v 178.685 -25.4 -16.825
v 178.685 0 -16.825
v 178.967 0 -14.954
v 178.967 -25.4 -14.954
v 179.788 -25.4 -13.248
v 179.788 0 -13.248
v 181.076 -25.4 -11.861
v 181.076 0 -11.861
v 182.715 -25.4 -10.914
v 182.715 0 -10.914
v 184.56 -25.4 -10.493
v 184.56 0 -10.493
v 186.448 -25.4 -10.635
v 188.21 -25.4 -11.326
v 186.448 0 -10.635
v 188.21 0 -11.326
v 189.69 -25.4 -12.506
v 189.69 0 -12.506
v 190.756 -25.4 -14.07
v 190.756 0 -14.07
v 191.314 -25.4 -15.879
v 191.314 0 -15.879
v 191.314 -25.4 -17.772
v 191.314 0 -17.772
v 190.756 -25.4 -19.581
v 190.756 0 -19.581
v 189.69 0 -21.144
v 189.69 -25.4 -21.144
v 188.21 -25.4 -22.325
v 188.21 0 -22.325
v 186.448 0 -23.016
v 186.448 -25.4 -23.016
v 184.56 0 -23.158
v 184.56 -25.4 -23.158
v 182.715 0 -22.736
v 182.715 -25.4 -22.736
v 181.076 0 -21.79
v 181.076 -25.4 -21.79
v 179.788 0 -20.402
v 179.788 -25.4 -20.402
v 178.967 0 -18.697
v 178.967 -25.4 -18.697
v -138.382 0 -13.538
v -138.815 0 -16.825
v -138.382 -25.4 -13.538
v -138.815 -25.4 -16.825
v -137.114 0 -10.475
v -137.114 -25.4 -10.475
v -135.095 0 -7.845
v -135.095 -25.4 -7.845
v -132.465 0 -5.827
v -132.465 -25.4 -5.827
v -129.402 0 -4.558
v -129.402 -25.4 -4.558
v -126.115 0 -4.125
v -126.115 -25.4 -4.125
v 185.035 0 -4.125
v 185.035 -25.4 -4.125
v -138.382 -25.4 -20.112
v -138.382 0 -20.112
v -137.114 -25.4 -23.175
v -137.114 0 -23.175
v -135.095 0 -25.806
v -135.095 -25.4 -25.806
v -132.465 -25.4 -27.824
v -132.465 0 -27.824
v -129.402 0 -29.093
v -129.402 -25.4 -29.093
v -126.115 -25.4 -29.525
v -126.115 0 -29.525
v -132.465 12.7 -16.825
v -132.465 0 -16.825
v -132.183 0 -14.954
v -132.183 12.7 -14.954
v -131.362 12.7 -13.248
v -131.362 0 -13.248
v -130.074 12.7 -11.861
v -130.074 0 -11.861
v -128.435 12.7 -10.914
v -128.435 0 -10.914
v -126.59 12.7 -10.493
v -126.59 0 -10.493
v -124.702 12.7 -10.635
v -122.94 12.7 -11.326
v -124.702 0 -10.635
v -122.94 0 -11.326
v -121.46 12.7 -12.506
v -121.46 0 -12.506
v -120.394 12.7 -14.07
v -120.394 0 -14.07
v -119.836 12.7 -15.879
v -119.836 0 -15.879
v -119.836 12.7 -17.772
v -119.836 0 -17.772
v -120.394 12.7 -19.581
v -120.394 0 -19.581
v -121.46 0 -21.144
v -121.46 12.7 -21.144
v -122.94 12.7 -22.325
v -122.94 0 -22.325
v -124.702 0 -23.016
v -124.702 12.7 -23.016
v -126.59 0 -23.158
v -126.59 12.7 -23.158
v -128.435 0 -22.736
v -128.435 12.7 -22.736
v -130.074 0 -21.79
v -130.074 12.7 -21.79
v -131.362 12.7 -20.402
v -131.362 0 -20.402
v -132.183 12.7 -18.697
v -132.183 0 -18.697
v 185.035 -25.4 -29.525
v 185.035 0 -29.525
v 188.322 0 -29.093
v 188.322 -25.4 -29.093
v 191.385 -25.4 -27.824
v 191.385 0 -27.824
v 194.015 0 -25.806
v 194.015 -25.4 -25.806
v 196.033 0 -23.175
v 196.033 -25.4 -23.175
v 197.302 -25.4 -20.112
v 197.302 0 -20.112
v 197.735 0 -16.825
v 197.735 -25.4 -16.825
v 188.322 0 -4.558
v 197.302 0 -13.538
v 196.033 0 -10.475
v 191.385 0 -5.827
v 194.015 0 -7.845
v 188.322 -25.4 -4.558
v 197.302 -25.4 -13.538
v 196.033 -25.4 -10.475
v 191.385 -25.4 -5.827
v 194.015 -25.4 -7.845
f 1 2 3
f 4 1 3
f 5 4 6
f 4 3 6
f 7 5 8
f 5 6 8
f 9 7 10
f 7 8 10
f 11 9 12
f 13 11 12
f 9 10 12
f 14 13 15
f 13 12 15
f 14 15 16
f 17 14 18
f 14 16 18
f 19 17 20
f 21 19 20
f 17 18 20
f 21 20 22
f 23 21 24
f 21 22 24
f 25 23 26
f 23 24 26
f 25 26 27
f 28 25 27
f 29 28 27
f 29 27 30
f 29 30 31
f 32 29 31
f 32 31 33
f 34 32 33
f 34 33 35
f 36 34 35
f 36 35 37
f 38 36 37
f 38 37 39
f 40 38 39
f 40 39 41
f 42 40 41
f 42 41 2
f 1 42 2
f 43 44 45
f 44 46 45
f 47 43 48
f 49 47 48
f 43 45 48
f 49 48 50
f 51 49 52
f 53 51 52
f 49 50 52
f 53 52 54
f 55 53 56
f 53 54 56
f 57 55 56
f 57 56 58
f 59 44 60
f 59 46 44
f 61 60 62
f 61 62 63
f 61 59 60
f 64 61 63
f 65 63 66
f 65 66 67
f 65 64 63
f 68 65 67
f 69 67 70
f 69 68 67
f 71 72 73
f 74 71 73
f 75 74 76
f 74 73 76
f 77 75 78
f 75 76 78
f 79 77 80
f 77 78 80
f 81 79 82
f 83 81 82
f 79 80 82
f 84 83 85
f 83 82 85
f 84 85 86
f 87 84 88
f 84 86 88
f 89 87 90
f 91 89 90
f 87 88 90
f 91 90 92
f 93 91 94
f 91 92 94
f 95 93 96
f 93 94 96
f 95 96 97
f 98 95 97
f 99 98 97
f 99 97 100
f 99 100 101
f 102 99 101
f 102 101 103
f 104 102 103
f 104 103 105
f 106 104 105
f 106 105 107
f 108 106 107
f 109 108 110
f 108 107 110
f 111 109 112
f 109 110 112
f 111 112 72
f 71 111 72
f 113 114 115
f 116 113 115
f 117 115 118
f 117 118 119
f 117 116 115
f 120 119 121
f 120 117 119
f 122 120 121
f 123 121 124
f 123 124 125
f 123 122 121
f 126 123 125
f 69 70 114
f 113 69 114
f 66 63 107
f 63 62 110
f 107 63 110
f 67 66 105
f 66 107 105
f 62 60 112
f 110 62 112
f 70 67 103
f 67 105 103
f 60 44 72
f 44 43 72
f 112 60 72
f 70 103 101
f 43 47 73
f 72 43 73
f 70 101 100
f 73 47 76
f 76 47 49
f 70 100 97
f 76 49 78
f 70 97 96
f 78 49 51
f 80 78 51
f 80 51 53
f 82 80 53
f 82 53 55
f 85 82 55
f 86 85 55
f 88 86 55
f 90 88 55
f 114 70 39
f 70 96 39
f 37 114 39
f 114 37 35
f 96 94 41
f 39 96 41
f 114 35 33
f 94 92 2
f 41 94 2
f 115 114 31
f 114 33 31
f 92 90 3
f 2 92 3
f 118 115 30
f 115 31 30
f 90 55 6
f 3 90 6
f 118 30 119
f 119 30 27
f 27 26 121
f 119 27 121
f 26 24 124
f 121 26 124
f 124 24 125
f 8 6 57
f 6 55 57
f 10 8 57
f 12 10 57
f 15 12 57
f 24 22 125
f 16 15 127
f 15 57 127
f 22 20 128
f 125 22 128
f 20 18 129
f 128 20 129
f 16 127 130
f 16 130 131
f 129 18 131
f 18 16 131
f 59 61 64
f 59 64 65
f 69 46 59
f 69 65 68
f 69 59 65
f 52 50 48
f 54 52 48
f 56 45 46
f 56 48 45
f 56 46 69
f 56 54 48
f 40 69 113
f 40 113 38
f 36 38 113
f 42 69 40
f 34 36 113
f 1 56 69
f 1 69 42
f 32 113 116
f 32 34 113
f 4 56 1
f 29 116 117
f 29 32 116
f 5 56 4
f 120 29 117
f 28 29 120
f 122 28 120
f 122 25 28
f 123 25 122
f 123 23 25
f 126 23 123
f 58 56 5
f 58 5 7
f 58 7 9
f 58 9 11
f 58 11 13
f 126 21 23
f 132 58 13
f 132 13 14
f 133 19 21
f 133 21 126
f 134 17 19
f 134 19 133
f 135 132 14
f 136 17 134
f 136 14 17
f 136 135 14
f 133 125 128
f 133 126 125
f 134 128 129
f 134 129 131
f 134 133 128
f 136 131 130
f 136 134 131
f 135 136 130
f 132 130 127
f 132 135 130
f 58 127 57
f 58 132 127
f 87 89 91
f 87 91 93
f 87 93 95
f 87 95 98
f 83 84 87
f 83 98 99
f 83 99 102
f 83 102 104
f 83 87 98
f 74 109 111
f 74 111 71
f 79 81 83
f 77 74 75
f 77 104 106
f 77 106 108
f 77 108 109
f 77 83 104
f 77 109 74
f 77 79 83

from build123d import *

# Parameters (mm, degrees)
F0_W     = 336.55
F0_H     = 25.4
F1_DEPTH = 25.4
F2_R     = 12.69999
F3_R     = 6.35
F4_DEPTH = 12.7
F5_R     = 6.35
F6_DEPTH = 25.401


# Not quite as in the source:
# - a fillet or chamfer is up to 0.001 mm smaller than in the source, because OpenCascade refuses the exact size


with BuildPart() as f1:
    # F0 (on Front) → F1 (new body)
    with BuildSketch(Plane.XZ):
        with Locations((29.4598335922, -16.8253869212)):
            Rectangle(F0_W, F0_H)
    extrude(amount=F1_DEPTH)

    # F2 (radius 12.7 in the source; OpenCascade refuses exactly that, so slightly less here)
    f2_edges = [f1.edges().sort_by_distance(p)[0] for p in [
        (-138.815166, -12.7, -4.125387),
        (-138.815166, -12.7, -29.525387),
        (197.734834, -12.7, -29.525387),
        (197.734834, -12.7, -4.125387),
    ]]
    fillet(f2_edges, radius=F2_R)

    # F3 (on face) → F4 (join)
    with BuildSketch(Plane(origin=(0, 0, 0), x_dir=(-1, 0, 0), z_dir=(0, 1, 0))):
        with Locations((126.1151664078, -16.8253869212)):
            Circle(F3_R)
    extrude(amount=F4_DEPTH)

    # F5 (on face) → F6 (cut, through all)
    with BuildSketch(Plane(origin=(0, 0, 0), x_dir=(-1, 0, 0), z_dir=(0, 1, 0))):
        with Locations((-185.0348335922, -16.8253869212)):
            Circle(F5_R)
    extrude(amount=-F6_DEPTH, mode=Mode.SUBTRACT)


solid = f1.part
